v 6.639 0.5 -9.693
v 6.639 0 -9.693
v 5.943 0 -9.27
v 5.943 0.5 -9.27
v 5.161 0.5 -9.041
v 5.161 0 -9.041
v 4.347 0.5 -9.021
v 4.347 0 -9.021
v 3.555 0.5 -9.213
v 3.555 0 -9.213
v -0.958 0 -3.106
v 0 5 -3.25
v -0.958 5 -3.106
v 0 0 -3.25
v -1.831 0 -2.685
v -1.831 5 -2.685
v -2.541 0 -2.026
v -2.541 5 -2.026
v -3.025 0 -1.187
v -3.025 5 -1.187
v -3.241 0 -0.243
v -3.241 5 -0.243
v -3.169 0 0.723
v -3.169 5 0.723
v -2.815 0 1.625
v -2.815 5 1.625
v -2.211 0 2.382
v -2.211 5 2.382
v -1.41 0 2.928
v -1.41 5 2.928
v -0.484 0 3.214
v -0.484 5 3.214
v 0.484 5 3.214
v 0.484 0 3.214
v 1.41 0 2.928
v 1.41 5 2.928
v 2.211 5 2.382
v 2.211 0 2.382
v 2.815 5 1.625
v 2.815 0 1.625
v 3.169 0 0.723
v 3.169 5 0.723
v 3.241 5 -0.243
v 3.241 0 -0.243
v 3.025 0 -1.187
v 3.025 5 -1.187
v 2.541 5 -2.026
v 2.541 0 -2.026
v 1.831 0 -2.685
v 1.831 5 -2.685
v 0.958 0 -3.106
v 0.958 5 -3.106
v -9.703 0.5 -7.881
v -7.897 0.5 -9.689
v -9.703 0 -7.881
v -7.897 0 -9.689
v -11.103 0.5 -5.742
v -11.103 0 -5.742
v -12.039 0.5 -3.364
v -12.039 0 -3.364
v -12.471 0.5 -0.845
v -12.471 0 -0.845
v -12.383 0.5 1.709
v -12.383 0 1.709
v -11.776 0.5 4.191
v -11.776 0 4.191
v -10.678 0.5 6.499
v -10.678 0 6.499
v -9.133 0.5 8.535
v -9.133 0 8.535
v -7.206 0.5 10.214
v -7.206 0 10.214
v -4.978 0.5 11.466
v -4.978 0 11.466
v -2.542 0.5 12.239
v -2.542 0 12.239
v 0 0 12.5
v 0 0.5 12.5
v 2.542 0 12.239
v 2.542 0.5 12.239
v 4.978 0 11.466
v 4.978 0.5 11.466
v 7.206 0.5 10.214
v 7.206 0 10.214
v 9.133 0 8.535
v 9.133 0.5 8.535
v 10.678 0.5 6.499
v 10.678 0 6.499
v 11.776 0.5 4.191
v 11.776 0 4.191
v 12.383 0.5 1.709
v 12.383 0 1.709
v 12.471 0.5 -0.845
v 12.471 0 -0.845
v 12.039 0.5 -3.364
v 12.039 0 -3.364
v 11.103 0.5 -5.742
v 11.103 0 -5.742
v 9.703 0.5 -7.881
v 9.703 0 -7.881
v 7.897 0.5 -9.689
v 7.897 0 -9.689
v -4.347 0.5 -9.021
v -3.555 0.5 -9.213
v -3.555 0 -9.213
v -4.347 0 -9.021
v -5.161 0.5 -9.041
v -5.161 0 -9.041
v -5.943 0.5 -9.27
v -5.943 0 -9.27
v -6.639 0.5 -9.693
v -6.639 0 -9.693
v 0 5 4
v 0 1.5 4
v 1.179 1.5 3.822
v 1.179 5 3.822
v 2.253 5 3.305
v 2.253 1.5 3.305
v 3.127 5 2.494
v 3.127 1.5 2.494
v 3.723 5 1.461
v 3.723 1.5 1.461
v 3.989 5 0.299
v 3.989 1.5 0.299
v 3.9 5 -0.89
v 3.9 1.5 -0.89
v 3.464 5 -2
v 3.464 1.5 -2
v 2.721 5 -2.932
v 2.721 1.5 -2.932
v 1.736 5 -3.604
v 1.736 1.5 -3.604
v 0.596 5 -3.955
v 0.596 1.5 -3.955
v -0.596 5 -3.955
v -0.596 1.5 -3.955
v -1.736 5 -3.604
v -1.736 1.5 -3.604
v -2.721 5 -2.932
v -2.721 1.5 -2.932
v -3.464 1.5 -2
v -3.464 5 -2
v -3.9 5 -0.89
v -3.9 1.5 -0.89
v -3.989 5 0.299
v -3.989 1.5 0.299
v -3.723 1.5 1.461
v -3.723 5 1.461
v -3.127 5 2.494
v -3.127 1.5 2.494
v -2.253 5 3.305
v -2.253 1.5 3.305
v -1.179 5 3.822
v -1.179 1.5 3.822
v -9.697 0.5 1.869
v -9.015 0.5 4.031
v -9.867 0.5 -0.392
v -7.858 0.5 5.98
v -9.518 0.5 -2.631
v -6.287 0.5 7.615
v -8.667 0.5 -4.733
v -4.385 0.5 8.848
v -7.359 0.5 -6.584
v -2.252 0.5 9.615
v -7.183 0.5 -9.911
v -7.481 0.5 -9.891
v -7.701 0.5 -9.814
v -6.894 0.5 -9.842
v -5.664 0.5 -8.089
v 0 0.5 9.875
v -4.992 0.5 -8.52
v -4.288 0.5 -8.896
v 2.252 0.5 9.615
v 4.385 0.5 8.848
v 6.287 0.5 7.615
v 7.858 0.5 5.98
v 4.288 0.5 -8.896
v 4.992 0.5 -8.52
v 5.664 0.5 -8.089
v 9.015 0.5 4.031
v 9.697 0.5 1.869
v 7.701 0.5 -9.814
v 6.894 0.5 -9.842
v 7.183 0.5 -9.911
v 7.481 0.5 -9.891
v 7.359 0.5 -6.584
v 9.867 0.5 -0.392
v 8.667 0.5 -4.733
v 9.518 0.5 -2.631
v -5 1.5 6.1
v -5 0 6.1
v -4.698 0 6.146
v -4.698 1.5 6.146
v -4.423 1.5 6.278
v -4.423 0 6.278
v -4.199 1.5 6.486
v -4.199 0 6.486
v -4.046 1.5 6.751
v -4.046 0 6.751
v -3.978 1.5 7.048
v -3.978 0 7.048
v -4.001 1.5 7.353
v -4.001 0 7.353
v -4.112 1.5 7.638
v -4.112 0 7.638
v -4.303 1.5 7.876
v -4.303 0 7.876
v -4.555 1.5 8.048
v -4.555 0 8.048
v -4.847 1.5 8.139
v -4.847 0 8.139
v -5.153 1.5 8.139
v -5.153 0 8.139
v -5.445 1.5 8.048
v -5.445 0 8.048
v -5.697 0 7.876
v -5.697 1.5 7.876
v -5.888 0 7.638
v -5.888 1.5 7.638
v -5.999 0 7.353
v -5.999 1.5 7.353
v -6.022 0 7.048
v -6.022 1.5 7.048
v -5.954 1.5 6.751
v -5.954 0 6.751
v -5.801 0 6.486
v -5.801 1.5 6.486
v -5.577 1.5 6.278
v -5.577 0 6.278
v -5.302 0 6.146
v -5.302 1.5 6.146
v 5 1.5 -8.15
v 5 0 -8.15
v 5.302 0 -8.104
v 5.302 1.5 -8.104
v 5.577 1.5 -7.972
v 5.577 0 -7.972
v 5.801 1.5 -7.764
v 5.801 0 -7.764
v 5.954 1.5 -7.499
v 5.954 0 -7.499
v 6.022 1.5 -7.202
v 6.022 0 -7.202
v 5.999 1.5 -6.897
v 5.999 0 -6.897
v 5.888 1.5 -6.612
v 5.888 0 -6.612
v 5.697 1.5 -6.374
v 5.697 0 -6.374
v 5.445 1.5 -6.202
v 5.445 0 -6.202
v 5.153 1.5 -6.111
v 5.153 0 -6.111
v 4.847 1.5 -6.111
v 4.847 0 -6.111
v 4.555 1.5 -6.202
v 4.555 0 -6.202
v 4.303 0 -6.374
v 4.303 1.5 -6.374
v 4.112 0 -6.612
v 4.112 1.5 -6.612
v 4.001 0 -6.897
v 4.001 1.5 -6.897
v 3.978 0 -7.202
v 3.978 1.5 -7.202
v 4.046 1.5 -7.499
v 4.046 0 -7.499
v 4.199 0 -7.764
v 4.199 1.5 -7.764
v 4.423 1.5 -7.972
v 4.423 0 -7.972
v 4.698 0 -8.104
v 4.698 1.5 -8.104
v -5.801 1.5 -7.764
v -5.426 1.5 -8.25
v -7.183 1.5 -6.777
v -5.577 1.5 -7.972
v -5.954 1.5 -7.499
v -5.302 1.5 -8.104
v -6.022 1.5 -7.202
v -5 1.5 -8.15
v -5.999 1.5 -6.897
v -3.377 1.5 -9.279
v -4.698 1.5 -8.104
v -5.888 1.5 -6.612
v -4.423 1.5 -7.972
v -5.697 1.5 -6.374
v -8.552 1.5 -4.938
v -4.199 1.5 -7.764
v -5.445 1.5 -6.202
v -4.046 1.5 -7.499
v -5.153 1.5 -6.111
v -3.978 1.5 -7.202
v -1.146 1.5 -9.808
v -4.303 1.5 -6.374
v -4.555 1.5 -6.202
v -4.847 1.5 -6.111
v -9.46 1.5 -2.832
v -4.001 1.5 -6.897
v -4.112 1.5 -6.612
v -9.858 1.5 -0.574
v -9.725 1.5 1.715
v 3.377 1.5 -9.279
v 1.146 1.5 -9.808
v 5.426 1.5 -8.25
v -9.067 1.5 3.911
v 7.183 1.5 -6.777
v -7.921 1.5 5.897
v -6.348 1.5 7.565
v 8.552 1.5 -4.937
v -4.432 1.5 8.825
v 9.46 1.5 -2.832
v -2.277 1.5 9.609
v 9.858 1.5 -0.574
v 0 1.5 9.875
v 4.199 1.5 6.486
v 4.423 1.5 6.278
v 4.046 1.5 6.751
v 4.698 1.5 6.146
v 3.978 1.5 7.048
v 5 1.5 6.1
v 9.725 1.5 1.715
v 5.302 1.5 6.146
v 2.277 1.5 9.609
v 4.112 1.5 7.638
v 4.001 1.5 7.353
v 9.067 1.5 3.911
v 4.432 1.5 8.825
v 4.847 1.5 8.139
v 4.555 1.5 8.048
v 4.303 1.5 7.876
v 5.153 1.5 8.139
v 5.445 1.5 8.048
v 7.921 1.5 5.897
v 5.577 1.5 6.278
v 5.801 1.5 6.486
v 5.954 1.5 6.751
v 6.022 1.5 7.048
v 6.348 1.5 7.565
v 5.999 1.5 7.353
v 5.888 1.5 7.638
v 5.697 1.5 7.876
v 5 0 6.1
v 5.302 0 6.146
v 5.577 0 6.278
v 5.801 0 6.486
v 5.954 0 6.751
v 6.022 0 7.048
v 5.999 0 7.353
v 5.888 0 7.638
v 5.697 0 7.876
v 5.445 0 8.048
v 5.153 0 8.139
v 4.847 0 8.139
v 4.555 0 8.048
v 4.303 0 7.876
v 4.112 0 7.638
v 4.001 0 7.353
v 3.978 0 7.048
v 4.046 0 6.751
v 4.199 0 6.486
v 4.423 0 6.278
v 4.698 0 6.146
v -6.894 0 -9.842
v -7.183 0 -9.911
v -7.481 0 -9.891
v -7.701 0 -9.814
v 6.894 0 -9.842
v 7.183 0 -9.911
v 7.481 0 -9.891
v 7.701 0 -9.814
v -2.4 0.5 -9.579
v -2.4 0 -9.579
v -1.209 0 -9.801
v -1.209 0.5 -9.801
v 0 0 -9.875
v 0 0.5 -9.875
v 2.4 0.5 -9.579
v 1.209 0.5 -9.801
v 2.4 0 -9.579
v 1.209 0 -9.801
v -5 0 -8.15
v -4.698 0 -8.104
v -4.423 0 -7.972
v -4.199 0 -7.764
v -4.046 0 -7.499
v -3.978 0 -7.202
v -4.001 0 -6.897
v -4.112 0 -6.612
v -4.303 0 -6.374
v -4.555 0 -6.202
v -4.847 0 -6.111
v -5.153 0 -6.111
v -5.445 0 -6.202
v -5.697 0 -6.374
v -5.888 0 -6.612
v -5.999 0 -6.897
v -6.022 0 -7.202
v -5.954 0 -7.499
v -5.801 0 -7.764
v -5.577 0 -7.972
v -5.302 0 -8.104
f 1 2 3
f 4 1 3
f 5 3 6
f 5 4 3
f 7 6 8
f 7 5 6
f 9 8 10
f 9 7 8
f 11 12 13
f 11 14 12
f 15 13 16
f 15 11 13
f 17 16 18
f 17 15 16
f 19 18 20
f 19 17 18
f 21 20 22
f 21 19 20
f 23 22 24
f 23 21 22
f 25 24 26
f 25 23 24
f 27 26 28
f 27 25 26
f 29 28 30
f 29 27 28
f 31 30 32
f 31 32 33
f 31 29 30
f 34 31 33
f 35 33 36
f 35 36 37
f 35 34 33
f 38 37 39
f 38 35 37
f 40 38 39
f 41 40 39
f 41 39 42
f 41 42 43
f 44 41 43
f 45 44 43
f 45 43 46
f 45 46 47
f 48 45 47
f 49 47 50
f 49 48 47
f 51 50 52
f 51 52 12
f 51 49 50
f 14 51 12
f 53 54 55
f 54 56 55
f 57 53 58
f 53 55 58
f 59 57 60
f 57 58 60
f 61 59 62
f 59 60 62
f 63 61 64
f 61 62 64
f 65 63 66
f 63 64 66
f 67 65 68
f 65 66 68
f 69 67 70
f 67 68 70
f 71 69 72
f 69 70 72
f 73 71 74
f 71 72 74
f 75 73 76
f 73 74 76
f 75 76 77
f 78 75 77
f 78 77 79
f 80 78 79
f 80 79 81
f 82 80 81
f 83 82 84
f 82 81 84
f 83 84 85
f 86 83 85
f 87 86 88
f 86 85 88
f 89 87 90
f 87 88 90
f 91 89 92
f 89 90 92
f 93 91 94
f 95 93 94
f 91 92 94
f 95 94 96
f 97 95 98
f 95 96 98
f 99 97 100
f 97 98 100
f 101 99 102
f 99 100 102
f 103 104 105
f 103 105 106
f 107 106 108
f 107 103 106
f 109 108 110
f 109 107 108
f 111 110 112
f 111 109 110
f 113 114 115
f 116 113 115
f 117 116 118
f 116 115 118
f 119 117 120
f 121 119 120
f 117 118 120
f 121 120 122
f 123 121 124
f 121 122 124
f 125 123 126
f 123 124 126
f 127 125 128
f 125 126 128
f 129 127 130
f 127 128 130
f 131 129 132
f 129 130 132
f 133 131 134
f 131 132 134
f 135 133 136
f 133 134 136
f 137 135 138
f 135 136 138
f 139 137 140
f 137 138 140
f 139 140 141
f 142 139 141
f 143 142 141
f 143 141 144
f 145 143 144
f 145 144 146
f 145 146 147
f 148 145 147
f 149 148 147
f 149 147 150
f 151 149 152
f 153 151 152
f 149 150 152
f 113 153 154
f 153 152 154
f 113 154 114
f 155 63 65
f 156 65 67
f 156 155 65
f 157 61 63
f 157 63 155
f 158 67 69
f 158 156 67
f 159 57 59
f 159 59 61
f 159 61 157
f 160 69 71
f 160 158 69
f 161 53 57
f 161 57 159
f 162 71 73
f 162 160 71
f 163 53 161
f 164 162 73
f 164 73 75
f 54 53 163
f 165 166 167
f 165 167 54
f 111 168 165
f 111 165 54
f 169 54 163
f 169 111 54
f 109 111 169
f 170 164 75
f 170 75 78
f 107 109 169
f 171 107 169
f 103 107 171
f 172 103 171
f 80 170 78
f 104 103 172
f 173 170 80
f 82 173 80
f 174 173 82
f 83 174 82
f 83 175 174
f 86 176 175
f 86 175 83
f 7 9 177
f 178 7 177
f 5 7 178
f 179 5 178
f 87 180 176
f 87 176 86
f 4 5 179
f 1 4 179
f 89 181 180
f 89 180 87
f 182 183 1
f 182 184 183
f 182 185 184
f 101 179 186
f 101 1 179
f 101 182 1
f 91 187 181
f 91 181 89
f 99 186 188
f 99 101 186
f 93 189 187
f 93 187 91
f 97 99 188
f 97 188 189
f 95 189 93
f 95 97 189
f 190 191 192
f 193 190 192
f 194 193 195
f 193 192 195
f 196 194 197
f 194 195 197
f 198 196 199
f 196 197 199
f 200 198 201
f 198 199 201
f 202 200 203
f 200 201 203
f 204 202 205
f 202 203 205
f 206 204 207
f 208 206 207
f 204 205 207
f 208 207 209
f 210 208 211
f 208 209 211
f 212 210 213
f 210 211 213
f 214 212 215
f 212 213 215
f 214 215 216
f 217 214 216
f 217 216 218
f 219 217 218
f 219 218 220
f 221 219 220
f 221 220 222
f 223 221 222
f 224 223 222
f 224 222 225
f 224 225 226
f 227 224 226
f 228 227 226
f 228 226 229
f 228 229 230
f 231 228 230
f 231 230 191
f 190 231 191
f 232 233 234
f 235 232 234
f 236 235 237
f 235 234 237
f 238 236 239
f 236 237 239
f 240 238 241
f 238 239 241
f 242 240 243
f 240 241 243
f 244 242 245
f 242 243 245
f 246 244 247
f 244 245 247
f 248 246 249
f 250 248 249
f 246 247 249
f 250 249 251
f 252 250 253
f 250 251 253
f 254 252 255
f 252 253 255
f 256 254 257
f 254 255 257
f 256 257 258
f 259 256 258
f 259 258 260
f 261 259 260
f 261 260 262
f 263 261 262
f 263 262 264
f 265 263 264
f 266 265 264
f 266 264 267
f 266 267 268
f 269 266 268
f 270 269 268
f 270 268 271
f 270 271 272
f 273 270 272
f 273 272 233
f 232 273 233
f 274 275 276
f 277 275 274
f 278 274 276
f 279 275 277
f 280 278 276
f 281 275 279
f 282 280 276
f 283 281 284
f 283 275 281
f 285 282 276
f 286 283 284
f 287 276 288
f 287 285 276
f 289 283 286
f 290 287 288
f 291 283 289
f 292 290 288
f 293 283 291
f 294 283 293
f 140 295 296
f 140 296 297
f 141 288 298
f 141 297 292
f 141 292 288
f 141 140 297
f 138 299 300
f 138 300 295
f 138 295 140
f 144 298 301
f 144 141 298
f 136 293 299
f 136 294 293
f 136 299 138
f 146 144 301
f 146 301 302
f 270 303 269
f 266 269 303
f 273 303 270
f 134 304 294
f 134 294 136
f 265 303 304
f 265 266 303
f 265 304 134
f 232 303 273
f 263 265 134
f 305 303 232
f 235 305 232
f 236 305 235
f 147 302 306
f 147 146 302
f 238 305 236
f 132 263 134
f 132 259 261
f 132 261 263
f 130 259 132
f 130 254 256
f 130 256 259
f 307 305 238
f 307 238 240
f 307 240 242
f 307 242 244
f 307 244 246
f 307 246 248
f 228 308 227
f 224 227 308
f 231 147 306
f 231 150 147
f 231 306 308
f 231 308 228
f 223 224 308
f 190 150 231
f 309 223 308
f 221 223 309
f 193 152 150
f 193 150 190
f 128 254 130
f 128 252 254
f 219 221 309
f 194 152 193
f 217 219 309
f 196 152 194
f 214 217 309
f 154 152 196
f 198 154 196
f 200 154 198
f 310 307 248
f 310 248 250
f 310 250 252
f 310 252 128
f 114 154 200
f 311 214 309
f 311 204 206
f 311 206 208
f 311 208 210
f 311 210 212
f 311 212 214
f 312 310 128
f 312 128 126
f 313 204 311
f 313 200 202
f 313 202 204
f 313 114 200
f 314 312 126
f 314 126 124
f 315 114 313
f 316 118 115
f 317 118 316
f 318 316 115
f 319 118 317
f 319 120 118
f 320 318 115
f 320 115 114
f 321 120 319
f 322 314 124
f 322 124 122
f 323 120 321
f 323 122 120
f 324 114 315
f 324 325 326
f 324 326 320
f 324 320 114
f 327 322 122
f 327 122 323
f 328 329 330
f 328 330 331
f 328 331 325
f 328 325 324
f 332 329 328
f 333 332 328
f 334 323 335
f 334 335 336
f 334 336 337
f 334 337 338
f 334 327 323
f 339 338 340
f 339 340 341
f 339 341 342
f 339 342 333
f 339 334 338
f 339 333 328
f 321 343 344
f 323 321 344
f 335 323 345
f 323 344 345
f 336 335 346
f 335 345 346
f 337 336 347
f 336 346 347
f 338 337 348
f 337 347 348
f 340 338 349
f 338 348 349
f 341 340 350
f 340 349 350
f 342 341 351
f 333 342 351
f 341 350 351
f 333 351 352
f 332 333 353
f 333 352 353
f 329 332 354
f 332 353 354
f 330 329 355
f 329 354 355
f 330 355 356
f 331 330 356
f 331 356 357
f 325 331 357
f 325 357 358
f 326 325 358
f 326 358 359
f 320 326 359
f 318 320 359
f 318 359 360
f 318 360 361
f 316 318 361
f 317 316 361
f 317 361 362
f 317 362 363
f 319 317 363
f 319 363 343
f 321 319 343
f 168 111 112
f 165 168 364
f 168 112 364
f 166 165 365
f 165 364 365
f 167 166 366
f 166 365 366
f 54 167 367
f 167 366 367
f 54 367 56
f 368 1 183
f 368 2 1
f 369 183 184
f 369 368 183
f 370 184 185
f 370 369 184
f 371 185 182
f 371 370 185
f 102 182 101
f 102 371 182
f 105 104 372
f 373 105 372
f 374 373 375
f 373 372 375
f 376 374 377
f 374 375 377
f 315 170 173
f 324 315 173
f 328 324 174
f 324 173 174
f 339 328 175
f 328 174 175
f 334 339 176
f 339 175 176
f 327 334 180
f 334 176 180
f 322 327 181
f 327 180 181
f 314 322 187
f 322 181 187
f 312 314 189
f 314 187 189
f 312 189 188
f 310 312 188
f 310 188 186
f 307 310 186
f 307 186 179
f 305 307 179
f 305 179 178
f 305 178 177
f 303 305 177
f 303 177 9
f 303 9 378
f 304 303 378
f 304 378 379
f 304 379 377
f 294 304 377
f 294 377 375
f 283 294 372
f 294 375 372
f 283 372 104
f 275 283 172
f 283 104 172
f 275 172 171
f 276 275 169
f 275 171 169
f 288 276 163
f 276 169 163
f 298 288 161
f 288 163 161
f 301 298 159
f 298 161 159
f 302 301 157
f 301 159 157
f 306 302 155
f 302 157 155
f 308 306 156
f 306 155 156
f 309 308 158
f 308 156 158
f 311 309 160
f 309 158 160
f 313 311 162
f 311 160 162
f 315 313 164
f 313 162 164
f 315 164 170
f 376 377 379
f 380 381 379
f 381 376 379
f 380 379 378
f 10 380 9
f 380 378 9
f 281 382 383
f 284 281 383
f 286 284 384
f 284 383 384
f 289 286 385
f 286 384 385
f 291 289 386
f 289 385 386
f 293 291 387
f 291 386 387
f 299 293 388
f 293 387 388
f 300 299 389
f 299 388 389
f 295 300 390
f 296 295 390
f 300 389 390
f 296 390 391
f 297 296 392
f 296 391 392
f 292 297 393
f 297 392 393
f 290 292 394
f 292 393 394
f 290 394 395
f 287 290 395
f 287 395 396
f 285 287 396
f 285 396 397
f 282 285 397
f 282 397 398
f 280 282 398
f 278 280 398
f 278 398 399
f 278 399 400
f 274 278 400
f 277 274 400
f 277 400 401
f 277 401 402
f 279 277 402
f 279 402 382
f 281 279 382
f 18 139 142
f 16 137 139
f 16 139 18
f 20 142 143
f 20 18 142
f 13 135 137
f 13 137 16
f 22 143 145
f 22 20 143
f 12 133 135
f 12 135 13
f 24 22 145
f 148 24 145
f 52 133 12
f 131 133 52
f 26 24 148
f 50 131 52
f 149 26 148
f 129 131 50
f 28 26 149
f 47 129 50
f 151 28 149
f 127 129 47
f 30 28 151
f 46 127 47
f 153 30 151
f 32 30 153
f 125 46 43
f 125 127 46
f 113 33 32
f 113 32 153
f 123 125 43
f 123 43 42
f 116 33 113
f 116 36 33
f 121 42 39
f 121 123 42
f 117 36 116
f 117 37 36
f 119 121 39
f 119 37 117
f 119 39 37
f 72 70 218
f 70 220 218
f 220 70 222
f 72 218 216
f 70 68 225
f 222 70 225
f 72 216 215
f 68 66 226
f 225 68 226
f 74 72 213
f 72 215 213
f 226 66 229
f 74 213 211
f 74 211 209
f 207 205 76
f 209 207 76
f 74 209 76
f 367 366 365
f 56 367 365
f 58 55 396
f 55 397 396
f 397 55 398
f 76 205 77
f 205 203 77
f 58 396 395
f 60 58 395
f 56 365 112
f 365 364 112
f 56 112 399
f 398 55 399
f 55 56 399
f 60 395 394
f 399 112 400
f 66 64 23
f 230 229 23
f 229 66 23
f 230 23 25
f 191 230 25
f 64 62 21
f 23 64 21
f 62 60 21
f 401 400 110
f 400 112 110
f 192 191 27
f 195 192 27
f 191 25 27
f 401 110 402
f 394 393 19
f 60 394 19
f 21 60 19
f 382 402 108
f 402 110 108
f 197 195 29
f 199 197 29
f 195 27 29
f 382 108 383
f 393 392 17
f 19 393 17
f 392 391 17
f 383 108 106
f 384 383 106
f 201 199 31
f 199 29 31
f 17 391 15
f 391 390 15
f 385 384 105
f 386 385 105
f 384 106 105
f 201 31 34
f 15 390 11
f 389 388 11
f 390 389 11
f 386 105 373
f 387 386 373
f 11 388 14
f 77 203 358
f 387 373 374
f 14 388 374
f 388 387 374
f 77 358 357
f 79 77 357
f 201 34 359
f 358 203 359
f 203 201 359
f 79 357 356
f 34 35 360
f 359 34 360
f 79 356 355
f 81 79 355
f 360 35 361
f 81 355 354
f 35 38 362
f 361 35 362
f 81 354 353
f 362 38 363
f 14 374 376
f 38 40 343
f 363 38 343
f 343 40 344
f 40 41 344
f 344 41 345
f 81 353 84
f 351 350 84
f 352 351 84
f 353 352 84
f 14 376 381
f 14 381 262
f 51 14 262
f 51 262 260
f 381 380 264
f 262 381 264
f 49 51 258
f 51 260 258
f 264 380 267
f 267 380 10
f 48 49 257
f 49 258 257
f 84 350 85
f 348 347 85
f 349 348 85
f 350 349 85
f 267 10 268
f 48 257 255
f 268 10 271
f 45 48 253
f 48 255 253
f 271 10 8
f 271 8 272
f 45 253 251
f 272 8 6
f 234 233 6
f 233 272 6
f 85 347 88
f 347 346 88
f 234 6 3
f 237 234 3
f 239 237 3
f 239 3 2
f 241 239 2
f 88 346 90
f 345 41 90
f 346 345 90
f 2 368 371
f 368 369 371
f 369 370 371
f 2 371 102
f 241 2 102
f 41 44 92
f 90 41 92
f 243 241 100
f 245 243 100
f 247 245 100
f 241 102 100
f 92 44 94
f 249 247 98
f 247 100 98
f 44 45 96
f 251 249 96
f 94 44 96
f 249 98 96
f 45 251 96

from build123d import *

# Parameters (mm, degrees)
SKETCH1_R           = 12.5
BOSS_EXTRUDE1_DEPTH = 1.5
SKETCH2_R           = 3.25
CUT_EXTRUDE1_DEPTH  = 18.741194999
SKETCH3_R           = 4
SKETCH3_R_2         = 3.25
BOSS_EXTRUDE2_DEPTH = 3.5
CUT_EXTRUDE2_START  = -1
SKETCH4_R           = 12.5
SKETCH4_R_2         = 9.875
CUT_EXTRUDE2_DEPTH  = 1
CUT_EXTRUDE3_DEPTH  = 19.241436347
FILLET1_R           = 3.125
FILLET2_R           = 1
SKETCH6_R           = 1.025
CUT_EXTRUDE4_DEPTH  = 19.371173207


with BuildPart() as part:
    # Sketch1 → Boss-Extrude1 (new body)
    with BuildSketch(Plane(origin=(0, 0, 0), x_dir=(1, 0, 0), z_dir=(0, 1, 0))):
        with Locations(Location((0, 0, 0), (0, 0, 270))):
            Circle(SKETCH1_R)
    extrude(amount=BOSS_EXTRUDE1_DEPTH)

    # Sketch2 → Cut-Extrude1 (cut, through all)
    with BuildSketch(Plane.XZ):
        with Locations(Location((0, 0, 0), (0, 0, 270))):
            Circle(SKETCH2_R)
    extrude(amount=-CUT_EXTRUDE1_DEPTH, mode=Mode.SUBTRACT)

    # Sketch3 → Boss-Extrude2 (add)
    with BuildSketch(Plane(origin=(0, 1.5, 0), x_dir=(1, 0, 0), z_dir=(0, 1, 0))):
        with Locations(Location((0, 0, 0), (0, 0, 270))):
            Circle(SKETCH3_R)
        with Locations(Location((0, 0, 0), (0, 0, 90))):
            Circle(SKETCH3_R_2, mode=Mode.SUBTRACT)
    extrude(amount=BOSS_EXTRUDE2_DEPTH)

    # Sketch4 → Cut-Extrude2 (cut)
    with BuildSketch(Plane(origin=(0, 1.5, 0), x_dir=(1, 0, 0), z_dir=(0, 1, 0)).offset(CUT_EXTRUDE2_START)):
        with Locations(Location((0, 0, 0), (0, 0, 270))):
            Circle(SKETCH4_R)
        with Locations(Location((0, 0, 0), (0, 0, 270))):
            Circle(SKETCH4_R_2, mode=Mode.SUBTRACT)
    extrude(amount=CUT_EXTRUDE2_DEPTH, mode=Mode.SUBTRACT)

    # Sketch5 → Cut-Extrude3 (cut, through all)
    with BuildSketch(Plane(origin=(0, 0.5, 0), x_dir=(1, 0, 0), z_dir=(0, 1, 0))):
        with BuildLine():
            ThreePointArc((0, 9.875), (2.96946977, 9.417954889), (5.664067309, 8.089126437))
            Line((5.664067309, 8.089126437), (7.169705454, 10.239400554))
            ThreePointArc((7.169705454, 10.239400554), (3.758822494, 11.921461884), (0, 12.5))
            Line((0, 12.5), (0, 9.875))
        make_face()
        with BuildLine():
            ThreePointArc((-5.664067309, 8.089126437), (-2.96946977, 9.417954889), (0, 9.875))
            Line((0, 9.875), (0, 12.5))
            ThreePointArc((0, 12.5), (-3.758822494, 11.921461884), (-7.169705454, 10.239400554))
            Line((-7.169705454, 10.239400554), (-5.664067309, 8.089126437))
        make_face()
    extrude(amount=-CUT_EXTRUDE3_DEPTH, mode=Mode.SUBTRACT)

    # Fillet1
    # the kernel refuses this fillet: 3.125 mm, written as the material it adds along each edge
    with BuildSketch(Plane(origin=(-5.664067309, 0.5, -8.089126437), x_dir=(-0.5735764363510301, 0, -0.819152044289003), z_dir=(0, -1, 0))) as fillet1_piece_1:
        with BuildLine():
            CenterArc((2.744375, 3.122719105), FILLET1_R, 193.898885593, 73.911882973)
            Line((-0.289128606, 2.372065474), (-0.349798678, 2.357052401))
            ThreePointArc((-0.349798678, 2.357052401), (-0.134589479, 1.187248558), (-0.0625, 0))
            Line((-0.0625, 0), (0, -0.0625))
            ThreePointArc((0, -0.0625), (1.3125, -0.0625), (2.6226125, -0.062454382))
            Line((2.6226125, -0.062454382), (2.625, 0))
        make_face()
    extrude(amount=0.5)
    with BuildSketch(Plane(origin=(5.664067309, 0.5, -8.089126437), x_dir=(-0.8825329923236406, 0, -0.4702504837427398), z_dir=(0, -1, 0))) as fillet1_piece_2:
        with BuildLine():
            CenterArc((2.767725938, 3.102041567), FILLET1_R, 189.13867423, 73.911882973)
            Line((-0.317607894, 2.605714916), (-0.379314571, 2.595788383))
            ThreePointArc((-0.379314571, 2.595788383), (-0.220844779, 1.295295365), (-0.062040831, -0.007562093))
            Line((-0.062040831, -0.007562093), (0.007562093, -0.062040831))
            ThreePointArc((0.007562093, -0.062040831), (1.194810651, 0.010048648), (2.382059209, -0.062040831))
            Line((2.382059209, -0.062040831), (2.389621301, 0))
        make_face()
    extrude(amount=0.5)

    # Fillet2
    fillet2_edges = [part.edges().sort_by_distance(p)[0] for p in [
        (-7.169705454, 0.25, -10.239400554),
        (7.169705454, 0.25, -10.239400554),
    ]]
    fillet(fillet2_edges, radius=FILLET2_R)

    # Sketch6 → Cut-Extrude4 (cut, through all)
    with BuildSketch(Plane.XZ):
        with Locations(Location((-5, 7.125, 0), (0, 0, 270))):
            Circle(SKETCH6_R)
        with Locations(Location((5, 7.125, 0), (0, 0, 270))):
            Circle(SKETCH6_R)
        with Locations(Location((5, -7.125, 0), (0, 0, 270))):
            Circle(SKETCH6_R)
        with Locations(Location((-5, -7.125, 0), (0, 0, 270))):
            Circle(SKETCH6_R)
    extrude(amount=-CUT_EXTRUDE4_DEPTH, mode=Mode.SUBTRACT)


solid = part.part
